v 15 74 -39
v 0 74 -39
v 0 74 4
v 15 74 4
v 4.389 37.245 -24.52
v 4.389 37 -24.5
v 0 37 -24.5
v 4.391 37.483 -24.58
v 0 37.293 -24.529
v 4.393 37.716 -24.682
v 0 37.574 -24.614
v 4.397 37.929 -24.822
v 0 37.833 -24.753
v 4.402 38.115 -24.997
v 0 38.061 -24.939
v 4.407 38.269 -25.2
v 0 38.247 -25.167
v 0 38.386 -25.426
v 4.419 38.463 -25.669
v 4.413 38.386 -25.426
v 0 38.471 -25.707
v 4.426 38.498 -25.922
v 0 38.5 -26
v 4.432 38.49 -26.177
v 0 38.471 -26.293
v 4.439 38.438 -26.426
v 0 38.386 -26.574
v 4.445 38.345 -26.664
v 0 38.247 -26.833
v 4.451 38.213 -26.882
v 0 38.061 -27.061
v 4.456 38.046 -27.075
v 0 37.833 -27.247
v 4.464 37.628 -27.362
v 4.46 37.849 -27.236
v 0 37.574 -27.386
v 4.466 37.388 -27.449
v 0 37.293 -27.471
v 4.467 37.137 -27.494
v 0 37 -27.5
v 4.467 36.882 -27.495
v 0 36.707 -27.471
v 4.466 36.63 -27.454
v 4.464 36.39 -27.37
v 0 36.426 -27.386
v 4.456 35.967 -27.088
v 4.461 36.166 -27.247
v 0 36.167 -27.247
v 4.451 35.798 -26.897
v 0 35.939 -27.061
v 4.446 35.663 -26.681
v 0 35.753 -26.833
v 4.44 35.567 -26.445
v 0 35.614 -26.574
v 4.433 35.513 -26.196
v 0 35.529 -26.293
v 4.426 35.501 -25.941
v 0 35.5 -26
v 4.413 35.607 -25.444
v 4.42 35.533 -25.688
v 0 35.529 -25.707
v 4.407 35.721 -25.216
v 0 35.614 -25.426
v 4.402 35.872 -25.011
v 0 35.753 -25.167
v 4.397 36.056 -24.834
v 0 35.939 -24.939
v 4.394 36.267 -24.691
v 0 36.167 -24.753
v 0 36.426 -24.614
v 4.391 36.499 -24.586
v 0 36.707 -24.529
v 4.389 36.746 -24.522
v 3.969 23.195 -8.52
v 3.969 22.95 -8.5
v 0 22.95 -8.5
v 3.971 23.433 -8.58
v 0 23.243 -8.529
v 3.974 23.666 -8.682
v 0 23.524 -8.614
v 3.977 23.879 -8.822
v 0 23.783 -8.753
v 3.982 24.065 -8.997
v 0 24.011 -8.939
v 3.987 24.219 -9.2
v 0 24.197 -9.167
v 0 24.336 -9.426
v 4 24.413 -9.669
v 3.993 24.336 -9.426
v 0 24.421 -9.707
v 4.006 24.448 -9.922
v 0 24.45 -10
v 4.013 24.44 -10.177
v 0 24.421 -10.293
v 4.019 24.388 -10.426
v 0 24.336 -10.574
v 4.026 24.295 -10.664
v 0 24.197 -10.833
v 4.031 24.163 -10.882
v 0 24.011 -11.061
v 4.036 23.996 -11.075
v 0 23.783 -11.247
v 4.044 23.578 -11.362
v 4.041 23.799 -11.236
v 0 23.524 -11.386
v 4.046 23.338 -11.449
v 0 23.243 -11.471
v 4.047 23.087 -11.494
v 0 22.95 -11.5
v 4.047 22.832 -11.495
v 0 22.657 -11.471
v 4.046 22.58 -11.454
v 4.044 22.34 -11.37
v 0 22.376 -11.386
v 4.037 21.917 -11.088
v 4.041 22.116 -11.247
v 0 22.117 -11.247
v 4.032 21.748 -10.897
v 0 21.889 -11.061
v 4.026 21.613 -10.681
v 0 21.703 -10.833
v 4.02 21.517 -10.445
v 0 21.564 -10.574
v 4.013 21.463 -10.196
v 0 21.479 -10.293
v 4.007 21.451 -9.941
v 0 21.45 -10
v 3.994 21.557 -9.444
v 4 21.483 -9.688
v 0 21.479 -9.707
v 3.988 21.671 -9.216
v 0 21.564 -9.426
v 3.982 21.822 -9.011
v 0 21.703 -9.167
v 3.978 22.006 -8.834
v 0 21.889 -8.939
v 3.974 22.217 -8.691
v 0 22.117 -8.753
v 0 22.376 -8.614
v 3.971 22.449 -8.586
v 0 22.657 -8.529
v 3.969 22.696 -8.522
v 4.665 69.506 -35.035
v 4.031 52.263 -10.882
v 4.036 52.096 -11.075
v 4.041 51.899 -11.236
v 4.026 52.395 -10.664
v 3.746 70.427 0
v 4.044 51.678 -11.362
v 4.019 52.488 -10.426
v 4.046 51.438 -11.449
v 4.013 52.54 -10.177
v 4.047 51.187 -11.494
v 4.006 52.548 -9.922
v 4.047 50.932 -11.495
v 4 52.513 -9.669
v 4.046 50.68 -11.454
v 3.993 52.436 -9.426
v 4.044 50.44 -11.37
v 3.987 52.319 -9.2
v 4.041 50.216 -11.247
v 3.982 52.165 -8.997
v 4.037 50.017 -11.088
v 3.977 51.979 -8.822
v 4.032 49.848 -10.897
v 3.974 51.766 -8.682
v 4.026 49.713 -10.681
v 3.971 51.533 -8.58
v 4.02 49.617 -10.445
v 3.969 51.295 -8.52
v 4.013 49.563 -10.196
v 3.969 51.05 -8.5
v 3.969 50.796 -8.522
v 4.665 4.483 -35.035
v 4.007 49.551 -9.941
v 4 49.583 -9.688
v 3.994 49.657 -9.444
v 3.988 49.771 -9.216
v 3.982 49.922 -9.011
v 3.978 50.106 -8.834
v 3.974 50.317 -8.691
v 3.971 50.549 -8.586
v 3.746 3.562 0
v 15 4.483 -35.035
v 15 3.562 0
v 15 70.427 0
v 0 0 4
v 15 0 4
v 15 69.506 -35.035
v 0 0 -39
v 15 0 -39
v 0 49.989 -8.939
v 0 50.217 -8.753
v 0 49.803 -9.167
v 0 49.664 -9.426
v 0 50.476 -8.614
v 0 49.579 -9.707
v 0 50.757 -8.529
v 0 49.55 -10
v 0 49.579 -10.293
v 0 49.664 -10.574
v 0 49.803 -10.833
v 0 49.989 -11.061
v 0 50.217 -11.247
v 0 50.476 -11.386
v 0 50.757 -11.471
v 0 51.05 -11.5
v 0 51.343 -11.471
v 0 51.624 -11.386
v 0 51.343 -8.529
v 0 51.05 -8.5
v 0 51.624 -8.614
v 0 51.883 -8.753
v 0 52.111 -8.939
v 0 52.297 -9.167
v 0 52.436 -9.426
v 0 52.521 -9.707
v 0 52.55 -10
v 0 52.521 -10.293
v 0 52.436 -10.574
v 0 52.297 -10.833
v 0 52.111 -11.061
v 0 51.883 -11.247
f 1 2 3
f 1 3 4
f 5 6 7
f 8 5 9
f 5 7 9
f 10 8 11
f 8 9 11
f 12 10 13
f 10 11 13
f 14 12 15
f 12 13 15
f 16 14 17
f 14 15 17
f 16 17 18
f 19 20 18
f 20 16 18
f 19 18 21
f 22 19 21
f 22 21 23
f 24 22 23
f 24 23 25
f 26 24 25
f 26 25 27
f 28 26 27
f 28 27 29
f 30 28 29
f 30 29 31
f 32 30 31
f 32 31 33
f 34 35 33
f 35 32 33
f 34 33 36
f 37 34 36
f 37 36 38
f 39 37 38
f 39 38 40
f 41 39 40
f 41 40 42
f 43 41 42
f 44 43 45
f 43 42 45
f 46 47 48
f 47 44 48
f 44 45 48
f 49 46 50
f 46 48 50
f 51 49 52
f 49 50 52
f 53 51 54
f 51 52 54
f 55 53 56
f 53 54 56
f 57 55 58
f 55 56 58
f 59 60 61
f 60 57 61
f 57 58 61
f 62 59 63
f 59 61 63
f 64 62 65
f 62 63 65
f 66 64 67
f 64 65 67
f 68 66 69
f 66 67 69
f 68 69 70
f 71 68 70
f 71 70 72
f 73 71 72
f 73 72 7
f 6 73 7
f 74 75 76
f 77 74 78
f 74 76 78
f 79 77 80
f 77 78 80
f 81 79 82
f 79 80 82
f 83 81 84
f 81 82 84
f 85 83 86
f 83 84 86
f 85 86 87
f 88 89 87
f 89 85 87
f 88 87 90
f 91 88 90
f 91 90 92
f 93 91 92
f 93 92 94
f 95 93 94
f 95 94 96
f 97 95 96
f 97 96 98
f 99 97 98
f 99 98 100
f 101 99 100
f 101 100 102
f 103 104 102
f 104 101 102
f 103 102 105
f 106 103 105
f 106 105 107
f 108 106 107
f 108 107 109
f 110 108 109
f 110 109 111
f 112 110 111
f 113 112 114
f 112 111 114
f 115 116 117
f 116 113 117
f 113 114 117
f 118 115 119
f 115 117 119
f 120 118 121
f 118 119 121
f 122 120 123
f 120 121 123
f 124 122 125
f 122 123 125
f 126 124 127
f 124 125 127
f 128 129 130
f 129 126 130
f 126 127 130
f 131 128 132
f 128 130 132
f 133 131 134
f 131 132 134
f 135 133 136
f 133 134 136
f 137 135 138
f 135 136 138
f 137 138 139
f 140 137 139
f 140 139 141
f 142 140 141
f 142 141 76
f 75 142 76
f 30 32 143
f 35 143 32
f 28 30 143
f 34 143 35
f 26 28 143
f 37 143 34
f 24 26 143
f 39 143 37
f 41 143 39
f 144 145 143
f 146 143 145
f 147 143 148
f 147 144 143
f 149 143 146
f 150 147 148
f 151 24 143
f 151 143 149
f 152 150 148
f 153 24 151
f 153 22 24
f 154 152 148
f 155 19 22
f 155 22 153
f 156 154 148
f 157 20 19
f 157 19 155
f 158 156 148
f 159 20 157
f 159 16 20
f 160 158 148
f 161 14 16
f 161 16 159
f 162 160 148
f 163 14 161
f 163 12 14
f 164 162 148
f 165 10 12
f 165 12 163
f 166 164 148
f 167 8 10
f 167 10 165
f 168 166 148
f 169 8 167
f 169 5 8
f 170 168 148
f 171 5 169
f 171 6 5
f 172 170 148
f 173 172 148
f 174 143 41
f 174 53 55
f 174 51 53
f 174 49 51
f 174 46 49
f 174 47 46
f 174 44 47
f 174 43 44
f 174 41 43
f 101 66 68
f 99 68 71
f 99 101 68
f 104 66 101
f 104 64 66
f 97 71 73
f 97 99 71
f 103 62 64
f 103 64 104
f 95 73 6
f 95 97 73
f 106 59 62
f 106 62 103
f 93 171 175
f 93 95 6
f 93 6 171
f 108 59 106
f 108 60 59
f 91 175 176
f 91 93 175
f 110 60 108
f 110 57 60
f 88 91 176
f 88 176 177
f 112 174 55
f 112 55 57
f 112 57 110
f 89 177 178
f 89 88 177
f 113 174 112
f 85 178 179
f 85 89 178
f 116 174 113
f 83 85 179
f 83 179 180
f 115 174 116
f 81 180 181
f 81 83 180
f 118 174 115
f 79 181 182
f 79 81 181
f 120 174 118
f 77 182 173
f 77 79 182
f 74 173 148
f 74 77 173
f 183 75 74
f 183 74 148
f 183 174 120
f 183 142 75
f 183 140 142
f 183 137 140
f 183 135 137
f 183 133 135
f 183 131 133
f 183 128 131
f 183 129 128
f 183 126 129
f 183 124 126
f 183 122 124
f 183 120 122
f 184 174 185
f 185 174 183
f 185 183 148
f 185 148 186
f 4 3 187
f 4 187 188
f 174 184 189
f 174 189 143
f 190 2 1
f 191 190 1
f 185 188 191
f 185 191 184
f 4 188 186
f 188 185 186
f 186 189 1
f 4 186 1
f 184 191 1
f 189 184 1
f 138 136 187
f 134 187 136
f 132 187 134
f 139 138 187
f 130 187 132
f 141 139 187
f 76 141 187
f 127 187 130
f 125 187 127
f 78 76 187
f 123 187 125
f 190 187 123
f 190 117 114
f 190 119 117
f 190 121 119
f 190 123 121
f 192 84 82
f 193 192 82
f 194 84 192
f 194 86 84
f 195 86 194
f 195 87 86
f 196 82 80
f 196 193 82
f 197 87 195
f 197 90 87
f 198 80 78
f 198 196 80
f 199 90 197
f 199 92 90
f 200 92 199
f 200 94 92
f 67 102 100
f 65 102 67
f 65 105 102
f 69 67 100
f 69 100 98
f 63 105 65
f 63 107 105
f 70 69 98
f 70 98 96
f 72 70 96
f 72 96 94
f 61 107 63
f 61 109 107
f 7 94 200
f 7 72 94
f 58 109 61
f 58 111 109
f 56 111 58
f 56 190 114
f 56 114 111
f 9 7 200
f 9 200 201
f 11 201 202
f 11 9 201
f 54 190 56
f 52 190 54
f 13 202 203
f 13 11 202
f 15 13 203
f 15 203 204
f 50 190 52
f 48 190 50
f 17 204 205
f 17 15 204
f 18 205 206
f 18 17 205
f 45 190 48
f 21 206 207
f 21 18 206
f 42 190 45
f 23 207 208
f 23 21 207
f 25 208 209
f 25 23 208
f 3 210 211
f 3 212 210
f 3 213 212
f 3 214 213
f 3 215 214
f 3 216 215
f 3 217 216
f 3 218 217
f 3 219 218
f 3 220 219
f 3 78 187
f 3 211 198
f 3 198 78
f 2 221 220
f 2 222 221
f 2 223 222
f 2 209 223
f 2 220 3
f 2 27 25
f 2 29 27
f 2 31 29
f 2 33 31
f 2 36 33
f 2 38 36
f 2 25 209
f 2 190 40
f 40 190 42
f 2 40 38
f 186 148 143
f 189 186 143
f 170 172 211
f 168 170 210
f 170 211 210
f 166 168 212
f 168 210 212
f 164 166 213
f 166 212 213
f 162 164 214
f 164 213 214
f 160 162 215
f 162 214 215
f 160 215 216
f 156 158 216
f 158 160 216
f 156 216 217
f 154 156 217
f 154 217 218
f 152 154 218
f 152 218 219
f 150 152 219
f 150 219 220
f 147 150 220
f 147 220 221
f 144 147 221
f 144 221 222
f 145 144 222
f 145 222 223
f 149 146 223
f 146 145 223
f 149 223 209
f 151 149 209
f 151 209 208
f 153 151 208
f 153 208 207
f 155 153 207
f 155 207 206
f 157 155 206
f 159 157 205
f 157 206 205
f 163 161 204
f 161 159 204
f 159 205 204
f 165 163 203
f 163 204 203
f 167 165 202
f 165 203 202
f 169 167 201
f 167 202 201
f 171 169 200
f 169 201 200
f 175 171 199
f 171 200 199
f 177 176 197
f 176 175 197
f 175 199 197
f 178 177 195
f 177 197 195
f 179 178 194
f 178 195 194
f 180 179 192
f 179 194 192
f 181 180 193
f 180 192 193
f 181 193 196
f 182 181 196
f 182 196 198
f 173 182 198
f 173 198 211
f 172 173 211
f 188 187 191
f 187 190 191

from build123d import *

# Parameters (mm, degrees)
SKETCH1_W           = 129
SKETCH1_H           = 74
BOSS_EXTRUDE1_DEPTH = 39
SKETCH3_R           = 1.5
CUT_EXTRUDE2_DEPTH  = 10
CAVITY1_START       = 3.561625
CAVITY1_DEPTH       = 66.86575
CAVITY1_START_2     = 3
CAVITY1_2_DEPTH     = 123
SKETCH4_W           = 114
SKETCH4_H           = 39
CUT_EXTRUDE3_DEPTH  = 100
SKETCH5_W           = 15
SKETCH5_H           = 74
BOSS_EXTRUDE2_DEPTH = 4


with BuildPart() as part:
    # Sketch1 → Boss-Extrude1 (new body)
    with BuildSketch(Plane.XY):
        with Locations((64.5, 37)):
            Rectangle(SKETCH1_W, SKETCH1_H)
    extrude(amount=-BOSS_EXTRUDE1_DEPTH)

    # Sketch3 → Cut-Extrude2 (cut)
    with BuildSketch(Plane.ZY):
        with Locations((-10, 51.05)):
            Circle(SKETCH3_R)
        with Locations((-10, 22.95)):
            Circle(SKETCH3_R)
        with Locations((-26, 37)):
            Circle(SKETCH3_R)
    extrude(amount=-CUT_EXTRUDE2_DEPTH, mode=Mode.SUBTRACT)

    # Cavity1: read off the stored shape, not the designer's step
    # Cavity1 outline → Cavity1 (cut)
    with BuildSketch(Plane(origin=(0, 0, 0), x_dir=(1, 0, 0), z_dir=(0, 1, 0)).offset(CAVITY1_START)):
        Polygon((124.330201477, 35.035), (4.664798523, 35.035), (3.746, 0), (125.249, 0), align=None)
    extrude(amount=CAVITY1_DEPTH, mode=Mode.SUBTRACT)

    # Cavity1 2 outline → Cavity1 2 (add)
    with BuildSketch(Plane.YZ.offset(CAVITY1_START_2)):
        Polygon((70.427375, 0), (69.505826955, -35.035), (70.427375, -35.035), align=None)
        Polygon((4.483173045, -35.035), (3.561625, 0), (3.561625, -35.035), align=None)
    extrude(amount=CAVITY1_2_DEPTH)

    # Sketch4 → Cut-Extrude3 (cut)
    with BuildSketch(Plane(origin=(0, 74, 0), x_dir=(1, 0, 0), z_dir=(0, 1, 0))):
        with Locations((72, 19.5)):
            Rectangle(SKETCH4_W, SKETCH4_H)
    extrude(amount=-CUT_EXTRUDE3_DEPTH, mode=Mode.SUBTRACT)

    # Sketch5 → Boss-Extrude2 (add)
    with BuildSketch(Plane.XY):
        with Locations((7.5, 37)):
            Rectangle(SKETCH5_W, SKETCH5_H)
    extrude(amount=BOSS_EXTRUDE2_DEPTH)


solid = part.part
